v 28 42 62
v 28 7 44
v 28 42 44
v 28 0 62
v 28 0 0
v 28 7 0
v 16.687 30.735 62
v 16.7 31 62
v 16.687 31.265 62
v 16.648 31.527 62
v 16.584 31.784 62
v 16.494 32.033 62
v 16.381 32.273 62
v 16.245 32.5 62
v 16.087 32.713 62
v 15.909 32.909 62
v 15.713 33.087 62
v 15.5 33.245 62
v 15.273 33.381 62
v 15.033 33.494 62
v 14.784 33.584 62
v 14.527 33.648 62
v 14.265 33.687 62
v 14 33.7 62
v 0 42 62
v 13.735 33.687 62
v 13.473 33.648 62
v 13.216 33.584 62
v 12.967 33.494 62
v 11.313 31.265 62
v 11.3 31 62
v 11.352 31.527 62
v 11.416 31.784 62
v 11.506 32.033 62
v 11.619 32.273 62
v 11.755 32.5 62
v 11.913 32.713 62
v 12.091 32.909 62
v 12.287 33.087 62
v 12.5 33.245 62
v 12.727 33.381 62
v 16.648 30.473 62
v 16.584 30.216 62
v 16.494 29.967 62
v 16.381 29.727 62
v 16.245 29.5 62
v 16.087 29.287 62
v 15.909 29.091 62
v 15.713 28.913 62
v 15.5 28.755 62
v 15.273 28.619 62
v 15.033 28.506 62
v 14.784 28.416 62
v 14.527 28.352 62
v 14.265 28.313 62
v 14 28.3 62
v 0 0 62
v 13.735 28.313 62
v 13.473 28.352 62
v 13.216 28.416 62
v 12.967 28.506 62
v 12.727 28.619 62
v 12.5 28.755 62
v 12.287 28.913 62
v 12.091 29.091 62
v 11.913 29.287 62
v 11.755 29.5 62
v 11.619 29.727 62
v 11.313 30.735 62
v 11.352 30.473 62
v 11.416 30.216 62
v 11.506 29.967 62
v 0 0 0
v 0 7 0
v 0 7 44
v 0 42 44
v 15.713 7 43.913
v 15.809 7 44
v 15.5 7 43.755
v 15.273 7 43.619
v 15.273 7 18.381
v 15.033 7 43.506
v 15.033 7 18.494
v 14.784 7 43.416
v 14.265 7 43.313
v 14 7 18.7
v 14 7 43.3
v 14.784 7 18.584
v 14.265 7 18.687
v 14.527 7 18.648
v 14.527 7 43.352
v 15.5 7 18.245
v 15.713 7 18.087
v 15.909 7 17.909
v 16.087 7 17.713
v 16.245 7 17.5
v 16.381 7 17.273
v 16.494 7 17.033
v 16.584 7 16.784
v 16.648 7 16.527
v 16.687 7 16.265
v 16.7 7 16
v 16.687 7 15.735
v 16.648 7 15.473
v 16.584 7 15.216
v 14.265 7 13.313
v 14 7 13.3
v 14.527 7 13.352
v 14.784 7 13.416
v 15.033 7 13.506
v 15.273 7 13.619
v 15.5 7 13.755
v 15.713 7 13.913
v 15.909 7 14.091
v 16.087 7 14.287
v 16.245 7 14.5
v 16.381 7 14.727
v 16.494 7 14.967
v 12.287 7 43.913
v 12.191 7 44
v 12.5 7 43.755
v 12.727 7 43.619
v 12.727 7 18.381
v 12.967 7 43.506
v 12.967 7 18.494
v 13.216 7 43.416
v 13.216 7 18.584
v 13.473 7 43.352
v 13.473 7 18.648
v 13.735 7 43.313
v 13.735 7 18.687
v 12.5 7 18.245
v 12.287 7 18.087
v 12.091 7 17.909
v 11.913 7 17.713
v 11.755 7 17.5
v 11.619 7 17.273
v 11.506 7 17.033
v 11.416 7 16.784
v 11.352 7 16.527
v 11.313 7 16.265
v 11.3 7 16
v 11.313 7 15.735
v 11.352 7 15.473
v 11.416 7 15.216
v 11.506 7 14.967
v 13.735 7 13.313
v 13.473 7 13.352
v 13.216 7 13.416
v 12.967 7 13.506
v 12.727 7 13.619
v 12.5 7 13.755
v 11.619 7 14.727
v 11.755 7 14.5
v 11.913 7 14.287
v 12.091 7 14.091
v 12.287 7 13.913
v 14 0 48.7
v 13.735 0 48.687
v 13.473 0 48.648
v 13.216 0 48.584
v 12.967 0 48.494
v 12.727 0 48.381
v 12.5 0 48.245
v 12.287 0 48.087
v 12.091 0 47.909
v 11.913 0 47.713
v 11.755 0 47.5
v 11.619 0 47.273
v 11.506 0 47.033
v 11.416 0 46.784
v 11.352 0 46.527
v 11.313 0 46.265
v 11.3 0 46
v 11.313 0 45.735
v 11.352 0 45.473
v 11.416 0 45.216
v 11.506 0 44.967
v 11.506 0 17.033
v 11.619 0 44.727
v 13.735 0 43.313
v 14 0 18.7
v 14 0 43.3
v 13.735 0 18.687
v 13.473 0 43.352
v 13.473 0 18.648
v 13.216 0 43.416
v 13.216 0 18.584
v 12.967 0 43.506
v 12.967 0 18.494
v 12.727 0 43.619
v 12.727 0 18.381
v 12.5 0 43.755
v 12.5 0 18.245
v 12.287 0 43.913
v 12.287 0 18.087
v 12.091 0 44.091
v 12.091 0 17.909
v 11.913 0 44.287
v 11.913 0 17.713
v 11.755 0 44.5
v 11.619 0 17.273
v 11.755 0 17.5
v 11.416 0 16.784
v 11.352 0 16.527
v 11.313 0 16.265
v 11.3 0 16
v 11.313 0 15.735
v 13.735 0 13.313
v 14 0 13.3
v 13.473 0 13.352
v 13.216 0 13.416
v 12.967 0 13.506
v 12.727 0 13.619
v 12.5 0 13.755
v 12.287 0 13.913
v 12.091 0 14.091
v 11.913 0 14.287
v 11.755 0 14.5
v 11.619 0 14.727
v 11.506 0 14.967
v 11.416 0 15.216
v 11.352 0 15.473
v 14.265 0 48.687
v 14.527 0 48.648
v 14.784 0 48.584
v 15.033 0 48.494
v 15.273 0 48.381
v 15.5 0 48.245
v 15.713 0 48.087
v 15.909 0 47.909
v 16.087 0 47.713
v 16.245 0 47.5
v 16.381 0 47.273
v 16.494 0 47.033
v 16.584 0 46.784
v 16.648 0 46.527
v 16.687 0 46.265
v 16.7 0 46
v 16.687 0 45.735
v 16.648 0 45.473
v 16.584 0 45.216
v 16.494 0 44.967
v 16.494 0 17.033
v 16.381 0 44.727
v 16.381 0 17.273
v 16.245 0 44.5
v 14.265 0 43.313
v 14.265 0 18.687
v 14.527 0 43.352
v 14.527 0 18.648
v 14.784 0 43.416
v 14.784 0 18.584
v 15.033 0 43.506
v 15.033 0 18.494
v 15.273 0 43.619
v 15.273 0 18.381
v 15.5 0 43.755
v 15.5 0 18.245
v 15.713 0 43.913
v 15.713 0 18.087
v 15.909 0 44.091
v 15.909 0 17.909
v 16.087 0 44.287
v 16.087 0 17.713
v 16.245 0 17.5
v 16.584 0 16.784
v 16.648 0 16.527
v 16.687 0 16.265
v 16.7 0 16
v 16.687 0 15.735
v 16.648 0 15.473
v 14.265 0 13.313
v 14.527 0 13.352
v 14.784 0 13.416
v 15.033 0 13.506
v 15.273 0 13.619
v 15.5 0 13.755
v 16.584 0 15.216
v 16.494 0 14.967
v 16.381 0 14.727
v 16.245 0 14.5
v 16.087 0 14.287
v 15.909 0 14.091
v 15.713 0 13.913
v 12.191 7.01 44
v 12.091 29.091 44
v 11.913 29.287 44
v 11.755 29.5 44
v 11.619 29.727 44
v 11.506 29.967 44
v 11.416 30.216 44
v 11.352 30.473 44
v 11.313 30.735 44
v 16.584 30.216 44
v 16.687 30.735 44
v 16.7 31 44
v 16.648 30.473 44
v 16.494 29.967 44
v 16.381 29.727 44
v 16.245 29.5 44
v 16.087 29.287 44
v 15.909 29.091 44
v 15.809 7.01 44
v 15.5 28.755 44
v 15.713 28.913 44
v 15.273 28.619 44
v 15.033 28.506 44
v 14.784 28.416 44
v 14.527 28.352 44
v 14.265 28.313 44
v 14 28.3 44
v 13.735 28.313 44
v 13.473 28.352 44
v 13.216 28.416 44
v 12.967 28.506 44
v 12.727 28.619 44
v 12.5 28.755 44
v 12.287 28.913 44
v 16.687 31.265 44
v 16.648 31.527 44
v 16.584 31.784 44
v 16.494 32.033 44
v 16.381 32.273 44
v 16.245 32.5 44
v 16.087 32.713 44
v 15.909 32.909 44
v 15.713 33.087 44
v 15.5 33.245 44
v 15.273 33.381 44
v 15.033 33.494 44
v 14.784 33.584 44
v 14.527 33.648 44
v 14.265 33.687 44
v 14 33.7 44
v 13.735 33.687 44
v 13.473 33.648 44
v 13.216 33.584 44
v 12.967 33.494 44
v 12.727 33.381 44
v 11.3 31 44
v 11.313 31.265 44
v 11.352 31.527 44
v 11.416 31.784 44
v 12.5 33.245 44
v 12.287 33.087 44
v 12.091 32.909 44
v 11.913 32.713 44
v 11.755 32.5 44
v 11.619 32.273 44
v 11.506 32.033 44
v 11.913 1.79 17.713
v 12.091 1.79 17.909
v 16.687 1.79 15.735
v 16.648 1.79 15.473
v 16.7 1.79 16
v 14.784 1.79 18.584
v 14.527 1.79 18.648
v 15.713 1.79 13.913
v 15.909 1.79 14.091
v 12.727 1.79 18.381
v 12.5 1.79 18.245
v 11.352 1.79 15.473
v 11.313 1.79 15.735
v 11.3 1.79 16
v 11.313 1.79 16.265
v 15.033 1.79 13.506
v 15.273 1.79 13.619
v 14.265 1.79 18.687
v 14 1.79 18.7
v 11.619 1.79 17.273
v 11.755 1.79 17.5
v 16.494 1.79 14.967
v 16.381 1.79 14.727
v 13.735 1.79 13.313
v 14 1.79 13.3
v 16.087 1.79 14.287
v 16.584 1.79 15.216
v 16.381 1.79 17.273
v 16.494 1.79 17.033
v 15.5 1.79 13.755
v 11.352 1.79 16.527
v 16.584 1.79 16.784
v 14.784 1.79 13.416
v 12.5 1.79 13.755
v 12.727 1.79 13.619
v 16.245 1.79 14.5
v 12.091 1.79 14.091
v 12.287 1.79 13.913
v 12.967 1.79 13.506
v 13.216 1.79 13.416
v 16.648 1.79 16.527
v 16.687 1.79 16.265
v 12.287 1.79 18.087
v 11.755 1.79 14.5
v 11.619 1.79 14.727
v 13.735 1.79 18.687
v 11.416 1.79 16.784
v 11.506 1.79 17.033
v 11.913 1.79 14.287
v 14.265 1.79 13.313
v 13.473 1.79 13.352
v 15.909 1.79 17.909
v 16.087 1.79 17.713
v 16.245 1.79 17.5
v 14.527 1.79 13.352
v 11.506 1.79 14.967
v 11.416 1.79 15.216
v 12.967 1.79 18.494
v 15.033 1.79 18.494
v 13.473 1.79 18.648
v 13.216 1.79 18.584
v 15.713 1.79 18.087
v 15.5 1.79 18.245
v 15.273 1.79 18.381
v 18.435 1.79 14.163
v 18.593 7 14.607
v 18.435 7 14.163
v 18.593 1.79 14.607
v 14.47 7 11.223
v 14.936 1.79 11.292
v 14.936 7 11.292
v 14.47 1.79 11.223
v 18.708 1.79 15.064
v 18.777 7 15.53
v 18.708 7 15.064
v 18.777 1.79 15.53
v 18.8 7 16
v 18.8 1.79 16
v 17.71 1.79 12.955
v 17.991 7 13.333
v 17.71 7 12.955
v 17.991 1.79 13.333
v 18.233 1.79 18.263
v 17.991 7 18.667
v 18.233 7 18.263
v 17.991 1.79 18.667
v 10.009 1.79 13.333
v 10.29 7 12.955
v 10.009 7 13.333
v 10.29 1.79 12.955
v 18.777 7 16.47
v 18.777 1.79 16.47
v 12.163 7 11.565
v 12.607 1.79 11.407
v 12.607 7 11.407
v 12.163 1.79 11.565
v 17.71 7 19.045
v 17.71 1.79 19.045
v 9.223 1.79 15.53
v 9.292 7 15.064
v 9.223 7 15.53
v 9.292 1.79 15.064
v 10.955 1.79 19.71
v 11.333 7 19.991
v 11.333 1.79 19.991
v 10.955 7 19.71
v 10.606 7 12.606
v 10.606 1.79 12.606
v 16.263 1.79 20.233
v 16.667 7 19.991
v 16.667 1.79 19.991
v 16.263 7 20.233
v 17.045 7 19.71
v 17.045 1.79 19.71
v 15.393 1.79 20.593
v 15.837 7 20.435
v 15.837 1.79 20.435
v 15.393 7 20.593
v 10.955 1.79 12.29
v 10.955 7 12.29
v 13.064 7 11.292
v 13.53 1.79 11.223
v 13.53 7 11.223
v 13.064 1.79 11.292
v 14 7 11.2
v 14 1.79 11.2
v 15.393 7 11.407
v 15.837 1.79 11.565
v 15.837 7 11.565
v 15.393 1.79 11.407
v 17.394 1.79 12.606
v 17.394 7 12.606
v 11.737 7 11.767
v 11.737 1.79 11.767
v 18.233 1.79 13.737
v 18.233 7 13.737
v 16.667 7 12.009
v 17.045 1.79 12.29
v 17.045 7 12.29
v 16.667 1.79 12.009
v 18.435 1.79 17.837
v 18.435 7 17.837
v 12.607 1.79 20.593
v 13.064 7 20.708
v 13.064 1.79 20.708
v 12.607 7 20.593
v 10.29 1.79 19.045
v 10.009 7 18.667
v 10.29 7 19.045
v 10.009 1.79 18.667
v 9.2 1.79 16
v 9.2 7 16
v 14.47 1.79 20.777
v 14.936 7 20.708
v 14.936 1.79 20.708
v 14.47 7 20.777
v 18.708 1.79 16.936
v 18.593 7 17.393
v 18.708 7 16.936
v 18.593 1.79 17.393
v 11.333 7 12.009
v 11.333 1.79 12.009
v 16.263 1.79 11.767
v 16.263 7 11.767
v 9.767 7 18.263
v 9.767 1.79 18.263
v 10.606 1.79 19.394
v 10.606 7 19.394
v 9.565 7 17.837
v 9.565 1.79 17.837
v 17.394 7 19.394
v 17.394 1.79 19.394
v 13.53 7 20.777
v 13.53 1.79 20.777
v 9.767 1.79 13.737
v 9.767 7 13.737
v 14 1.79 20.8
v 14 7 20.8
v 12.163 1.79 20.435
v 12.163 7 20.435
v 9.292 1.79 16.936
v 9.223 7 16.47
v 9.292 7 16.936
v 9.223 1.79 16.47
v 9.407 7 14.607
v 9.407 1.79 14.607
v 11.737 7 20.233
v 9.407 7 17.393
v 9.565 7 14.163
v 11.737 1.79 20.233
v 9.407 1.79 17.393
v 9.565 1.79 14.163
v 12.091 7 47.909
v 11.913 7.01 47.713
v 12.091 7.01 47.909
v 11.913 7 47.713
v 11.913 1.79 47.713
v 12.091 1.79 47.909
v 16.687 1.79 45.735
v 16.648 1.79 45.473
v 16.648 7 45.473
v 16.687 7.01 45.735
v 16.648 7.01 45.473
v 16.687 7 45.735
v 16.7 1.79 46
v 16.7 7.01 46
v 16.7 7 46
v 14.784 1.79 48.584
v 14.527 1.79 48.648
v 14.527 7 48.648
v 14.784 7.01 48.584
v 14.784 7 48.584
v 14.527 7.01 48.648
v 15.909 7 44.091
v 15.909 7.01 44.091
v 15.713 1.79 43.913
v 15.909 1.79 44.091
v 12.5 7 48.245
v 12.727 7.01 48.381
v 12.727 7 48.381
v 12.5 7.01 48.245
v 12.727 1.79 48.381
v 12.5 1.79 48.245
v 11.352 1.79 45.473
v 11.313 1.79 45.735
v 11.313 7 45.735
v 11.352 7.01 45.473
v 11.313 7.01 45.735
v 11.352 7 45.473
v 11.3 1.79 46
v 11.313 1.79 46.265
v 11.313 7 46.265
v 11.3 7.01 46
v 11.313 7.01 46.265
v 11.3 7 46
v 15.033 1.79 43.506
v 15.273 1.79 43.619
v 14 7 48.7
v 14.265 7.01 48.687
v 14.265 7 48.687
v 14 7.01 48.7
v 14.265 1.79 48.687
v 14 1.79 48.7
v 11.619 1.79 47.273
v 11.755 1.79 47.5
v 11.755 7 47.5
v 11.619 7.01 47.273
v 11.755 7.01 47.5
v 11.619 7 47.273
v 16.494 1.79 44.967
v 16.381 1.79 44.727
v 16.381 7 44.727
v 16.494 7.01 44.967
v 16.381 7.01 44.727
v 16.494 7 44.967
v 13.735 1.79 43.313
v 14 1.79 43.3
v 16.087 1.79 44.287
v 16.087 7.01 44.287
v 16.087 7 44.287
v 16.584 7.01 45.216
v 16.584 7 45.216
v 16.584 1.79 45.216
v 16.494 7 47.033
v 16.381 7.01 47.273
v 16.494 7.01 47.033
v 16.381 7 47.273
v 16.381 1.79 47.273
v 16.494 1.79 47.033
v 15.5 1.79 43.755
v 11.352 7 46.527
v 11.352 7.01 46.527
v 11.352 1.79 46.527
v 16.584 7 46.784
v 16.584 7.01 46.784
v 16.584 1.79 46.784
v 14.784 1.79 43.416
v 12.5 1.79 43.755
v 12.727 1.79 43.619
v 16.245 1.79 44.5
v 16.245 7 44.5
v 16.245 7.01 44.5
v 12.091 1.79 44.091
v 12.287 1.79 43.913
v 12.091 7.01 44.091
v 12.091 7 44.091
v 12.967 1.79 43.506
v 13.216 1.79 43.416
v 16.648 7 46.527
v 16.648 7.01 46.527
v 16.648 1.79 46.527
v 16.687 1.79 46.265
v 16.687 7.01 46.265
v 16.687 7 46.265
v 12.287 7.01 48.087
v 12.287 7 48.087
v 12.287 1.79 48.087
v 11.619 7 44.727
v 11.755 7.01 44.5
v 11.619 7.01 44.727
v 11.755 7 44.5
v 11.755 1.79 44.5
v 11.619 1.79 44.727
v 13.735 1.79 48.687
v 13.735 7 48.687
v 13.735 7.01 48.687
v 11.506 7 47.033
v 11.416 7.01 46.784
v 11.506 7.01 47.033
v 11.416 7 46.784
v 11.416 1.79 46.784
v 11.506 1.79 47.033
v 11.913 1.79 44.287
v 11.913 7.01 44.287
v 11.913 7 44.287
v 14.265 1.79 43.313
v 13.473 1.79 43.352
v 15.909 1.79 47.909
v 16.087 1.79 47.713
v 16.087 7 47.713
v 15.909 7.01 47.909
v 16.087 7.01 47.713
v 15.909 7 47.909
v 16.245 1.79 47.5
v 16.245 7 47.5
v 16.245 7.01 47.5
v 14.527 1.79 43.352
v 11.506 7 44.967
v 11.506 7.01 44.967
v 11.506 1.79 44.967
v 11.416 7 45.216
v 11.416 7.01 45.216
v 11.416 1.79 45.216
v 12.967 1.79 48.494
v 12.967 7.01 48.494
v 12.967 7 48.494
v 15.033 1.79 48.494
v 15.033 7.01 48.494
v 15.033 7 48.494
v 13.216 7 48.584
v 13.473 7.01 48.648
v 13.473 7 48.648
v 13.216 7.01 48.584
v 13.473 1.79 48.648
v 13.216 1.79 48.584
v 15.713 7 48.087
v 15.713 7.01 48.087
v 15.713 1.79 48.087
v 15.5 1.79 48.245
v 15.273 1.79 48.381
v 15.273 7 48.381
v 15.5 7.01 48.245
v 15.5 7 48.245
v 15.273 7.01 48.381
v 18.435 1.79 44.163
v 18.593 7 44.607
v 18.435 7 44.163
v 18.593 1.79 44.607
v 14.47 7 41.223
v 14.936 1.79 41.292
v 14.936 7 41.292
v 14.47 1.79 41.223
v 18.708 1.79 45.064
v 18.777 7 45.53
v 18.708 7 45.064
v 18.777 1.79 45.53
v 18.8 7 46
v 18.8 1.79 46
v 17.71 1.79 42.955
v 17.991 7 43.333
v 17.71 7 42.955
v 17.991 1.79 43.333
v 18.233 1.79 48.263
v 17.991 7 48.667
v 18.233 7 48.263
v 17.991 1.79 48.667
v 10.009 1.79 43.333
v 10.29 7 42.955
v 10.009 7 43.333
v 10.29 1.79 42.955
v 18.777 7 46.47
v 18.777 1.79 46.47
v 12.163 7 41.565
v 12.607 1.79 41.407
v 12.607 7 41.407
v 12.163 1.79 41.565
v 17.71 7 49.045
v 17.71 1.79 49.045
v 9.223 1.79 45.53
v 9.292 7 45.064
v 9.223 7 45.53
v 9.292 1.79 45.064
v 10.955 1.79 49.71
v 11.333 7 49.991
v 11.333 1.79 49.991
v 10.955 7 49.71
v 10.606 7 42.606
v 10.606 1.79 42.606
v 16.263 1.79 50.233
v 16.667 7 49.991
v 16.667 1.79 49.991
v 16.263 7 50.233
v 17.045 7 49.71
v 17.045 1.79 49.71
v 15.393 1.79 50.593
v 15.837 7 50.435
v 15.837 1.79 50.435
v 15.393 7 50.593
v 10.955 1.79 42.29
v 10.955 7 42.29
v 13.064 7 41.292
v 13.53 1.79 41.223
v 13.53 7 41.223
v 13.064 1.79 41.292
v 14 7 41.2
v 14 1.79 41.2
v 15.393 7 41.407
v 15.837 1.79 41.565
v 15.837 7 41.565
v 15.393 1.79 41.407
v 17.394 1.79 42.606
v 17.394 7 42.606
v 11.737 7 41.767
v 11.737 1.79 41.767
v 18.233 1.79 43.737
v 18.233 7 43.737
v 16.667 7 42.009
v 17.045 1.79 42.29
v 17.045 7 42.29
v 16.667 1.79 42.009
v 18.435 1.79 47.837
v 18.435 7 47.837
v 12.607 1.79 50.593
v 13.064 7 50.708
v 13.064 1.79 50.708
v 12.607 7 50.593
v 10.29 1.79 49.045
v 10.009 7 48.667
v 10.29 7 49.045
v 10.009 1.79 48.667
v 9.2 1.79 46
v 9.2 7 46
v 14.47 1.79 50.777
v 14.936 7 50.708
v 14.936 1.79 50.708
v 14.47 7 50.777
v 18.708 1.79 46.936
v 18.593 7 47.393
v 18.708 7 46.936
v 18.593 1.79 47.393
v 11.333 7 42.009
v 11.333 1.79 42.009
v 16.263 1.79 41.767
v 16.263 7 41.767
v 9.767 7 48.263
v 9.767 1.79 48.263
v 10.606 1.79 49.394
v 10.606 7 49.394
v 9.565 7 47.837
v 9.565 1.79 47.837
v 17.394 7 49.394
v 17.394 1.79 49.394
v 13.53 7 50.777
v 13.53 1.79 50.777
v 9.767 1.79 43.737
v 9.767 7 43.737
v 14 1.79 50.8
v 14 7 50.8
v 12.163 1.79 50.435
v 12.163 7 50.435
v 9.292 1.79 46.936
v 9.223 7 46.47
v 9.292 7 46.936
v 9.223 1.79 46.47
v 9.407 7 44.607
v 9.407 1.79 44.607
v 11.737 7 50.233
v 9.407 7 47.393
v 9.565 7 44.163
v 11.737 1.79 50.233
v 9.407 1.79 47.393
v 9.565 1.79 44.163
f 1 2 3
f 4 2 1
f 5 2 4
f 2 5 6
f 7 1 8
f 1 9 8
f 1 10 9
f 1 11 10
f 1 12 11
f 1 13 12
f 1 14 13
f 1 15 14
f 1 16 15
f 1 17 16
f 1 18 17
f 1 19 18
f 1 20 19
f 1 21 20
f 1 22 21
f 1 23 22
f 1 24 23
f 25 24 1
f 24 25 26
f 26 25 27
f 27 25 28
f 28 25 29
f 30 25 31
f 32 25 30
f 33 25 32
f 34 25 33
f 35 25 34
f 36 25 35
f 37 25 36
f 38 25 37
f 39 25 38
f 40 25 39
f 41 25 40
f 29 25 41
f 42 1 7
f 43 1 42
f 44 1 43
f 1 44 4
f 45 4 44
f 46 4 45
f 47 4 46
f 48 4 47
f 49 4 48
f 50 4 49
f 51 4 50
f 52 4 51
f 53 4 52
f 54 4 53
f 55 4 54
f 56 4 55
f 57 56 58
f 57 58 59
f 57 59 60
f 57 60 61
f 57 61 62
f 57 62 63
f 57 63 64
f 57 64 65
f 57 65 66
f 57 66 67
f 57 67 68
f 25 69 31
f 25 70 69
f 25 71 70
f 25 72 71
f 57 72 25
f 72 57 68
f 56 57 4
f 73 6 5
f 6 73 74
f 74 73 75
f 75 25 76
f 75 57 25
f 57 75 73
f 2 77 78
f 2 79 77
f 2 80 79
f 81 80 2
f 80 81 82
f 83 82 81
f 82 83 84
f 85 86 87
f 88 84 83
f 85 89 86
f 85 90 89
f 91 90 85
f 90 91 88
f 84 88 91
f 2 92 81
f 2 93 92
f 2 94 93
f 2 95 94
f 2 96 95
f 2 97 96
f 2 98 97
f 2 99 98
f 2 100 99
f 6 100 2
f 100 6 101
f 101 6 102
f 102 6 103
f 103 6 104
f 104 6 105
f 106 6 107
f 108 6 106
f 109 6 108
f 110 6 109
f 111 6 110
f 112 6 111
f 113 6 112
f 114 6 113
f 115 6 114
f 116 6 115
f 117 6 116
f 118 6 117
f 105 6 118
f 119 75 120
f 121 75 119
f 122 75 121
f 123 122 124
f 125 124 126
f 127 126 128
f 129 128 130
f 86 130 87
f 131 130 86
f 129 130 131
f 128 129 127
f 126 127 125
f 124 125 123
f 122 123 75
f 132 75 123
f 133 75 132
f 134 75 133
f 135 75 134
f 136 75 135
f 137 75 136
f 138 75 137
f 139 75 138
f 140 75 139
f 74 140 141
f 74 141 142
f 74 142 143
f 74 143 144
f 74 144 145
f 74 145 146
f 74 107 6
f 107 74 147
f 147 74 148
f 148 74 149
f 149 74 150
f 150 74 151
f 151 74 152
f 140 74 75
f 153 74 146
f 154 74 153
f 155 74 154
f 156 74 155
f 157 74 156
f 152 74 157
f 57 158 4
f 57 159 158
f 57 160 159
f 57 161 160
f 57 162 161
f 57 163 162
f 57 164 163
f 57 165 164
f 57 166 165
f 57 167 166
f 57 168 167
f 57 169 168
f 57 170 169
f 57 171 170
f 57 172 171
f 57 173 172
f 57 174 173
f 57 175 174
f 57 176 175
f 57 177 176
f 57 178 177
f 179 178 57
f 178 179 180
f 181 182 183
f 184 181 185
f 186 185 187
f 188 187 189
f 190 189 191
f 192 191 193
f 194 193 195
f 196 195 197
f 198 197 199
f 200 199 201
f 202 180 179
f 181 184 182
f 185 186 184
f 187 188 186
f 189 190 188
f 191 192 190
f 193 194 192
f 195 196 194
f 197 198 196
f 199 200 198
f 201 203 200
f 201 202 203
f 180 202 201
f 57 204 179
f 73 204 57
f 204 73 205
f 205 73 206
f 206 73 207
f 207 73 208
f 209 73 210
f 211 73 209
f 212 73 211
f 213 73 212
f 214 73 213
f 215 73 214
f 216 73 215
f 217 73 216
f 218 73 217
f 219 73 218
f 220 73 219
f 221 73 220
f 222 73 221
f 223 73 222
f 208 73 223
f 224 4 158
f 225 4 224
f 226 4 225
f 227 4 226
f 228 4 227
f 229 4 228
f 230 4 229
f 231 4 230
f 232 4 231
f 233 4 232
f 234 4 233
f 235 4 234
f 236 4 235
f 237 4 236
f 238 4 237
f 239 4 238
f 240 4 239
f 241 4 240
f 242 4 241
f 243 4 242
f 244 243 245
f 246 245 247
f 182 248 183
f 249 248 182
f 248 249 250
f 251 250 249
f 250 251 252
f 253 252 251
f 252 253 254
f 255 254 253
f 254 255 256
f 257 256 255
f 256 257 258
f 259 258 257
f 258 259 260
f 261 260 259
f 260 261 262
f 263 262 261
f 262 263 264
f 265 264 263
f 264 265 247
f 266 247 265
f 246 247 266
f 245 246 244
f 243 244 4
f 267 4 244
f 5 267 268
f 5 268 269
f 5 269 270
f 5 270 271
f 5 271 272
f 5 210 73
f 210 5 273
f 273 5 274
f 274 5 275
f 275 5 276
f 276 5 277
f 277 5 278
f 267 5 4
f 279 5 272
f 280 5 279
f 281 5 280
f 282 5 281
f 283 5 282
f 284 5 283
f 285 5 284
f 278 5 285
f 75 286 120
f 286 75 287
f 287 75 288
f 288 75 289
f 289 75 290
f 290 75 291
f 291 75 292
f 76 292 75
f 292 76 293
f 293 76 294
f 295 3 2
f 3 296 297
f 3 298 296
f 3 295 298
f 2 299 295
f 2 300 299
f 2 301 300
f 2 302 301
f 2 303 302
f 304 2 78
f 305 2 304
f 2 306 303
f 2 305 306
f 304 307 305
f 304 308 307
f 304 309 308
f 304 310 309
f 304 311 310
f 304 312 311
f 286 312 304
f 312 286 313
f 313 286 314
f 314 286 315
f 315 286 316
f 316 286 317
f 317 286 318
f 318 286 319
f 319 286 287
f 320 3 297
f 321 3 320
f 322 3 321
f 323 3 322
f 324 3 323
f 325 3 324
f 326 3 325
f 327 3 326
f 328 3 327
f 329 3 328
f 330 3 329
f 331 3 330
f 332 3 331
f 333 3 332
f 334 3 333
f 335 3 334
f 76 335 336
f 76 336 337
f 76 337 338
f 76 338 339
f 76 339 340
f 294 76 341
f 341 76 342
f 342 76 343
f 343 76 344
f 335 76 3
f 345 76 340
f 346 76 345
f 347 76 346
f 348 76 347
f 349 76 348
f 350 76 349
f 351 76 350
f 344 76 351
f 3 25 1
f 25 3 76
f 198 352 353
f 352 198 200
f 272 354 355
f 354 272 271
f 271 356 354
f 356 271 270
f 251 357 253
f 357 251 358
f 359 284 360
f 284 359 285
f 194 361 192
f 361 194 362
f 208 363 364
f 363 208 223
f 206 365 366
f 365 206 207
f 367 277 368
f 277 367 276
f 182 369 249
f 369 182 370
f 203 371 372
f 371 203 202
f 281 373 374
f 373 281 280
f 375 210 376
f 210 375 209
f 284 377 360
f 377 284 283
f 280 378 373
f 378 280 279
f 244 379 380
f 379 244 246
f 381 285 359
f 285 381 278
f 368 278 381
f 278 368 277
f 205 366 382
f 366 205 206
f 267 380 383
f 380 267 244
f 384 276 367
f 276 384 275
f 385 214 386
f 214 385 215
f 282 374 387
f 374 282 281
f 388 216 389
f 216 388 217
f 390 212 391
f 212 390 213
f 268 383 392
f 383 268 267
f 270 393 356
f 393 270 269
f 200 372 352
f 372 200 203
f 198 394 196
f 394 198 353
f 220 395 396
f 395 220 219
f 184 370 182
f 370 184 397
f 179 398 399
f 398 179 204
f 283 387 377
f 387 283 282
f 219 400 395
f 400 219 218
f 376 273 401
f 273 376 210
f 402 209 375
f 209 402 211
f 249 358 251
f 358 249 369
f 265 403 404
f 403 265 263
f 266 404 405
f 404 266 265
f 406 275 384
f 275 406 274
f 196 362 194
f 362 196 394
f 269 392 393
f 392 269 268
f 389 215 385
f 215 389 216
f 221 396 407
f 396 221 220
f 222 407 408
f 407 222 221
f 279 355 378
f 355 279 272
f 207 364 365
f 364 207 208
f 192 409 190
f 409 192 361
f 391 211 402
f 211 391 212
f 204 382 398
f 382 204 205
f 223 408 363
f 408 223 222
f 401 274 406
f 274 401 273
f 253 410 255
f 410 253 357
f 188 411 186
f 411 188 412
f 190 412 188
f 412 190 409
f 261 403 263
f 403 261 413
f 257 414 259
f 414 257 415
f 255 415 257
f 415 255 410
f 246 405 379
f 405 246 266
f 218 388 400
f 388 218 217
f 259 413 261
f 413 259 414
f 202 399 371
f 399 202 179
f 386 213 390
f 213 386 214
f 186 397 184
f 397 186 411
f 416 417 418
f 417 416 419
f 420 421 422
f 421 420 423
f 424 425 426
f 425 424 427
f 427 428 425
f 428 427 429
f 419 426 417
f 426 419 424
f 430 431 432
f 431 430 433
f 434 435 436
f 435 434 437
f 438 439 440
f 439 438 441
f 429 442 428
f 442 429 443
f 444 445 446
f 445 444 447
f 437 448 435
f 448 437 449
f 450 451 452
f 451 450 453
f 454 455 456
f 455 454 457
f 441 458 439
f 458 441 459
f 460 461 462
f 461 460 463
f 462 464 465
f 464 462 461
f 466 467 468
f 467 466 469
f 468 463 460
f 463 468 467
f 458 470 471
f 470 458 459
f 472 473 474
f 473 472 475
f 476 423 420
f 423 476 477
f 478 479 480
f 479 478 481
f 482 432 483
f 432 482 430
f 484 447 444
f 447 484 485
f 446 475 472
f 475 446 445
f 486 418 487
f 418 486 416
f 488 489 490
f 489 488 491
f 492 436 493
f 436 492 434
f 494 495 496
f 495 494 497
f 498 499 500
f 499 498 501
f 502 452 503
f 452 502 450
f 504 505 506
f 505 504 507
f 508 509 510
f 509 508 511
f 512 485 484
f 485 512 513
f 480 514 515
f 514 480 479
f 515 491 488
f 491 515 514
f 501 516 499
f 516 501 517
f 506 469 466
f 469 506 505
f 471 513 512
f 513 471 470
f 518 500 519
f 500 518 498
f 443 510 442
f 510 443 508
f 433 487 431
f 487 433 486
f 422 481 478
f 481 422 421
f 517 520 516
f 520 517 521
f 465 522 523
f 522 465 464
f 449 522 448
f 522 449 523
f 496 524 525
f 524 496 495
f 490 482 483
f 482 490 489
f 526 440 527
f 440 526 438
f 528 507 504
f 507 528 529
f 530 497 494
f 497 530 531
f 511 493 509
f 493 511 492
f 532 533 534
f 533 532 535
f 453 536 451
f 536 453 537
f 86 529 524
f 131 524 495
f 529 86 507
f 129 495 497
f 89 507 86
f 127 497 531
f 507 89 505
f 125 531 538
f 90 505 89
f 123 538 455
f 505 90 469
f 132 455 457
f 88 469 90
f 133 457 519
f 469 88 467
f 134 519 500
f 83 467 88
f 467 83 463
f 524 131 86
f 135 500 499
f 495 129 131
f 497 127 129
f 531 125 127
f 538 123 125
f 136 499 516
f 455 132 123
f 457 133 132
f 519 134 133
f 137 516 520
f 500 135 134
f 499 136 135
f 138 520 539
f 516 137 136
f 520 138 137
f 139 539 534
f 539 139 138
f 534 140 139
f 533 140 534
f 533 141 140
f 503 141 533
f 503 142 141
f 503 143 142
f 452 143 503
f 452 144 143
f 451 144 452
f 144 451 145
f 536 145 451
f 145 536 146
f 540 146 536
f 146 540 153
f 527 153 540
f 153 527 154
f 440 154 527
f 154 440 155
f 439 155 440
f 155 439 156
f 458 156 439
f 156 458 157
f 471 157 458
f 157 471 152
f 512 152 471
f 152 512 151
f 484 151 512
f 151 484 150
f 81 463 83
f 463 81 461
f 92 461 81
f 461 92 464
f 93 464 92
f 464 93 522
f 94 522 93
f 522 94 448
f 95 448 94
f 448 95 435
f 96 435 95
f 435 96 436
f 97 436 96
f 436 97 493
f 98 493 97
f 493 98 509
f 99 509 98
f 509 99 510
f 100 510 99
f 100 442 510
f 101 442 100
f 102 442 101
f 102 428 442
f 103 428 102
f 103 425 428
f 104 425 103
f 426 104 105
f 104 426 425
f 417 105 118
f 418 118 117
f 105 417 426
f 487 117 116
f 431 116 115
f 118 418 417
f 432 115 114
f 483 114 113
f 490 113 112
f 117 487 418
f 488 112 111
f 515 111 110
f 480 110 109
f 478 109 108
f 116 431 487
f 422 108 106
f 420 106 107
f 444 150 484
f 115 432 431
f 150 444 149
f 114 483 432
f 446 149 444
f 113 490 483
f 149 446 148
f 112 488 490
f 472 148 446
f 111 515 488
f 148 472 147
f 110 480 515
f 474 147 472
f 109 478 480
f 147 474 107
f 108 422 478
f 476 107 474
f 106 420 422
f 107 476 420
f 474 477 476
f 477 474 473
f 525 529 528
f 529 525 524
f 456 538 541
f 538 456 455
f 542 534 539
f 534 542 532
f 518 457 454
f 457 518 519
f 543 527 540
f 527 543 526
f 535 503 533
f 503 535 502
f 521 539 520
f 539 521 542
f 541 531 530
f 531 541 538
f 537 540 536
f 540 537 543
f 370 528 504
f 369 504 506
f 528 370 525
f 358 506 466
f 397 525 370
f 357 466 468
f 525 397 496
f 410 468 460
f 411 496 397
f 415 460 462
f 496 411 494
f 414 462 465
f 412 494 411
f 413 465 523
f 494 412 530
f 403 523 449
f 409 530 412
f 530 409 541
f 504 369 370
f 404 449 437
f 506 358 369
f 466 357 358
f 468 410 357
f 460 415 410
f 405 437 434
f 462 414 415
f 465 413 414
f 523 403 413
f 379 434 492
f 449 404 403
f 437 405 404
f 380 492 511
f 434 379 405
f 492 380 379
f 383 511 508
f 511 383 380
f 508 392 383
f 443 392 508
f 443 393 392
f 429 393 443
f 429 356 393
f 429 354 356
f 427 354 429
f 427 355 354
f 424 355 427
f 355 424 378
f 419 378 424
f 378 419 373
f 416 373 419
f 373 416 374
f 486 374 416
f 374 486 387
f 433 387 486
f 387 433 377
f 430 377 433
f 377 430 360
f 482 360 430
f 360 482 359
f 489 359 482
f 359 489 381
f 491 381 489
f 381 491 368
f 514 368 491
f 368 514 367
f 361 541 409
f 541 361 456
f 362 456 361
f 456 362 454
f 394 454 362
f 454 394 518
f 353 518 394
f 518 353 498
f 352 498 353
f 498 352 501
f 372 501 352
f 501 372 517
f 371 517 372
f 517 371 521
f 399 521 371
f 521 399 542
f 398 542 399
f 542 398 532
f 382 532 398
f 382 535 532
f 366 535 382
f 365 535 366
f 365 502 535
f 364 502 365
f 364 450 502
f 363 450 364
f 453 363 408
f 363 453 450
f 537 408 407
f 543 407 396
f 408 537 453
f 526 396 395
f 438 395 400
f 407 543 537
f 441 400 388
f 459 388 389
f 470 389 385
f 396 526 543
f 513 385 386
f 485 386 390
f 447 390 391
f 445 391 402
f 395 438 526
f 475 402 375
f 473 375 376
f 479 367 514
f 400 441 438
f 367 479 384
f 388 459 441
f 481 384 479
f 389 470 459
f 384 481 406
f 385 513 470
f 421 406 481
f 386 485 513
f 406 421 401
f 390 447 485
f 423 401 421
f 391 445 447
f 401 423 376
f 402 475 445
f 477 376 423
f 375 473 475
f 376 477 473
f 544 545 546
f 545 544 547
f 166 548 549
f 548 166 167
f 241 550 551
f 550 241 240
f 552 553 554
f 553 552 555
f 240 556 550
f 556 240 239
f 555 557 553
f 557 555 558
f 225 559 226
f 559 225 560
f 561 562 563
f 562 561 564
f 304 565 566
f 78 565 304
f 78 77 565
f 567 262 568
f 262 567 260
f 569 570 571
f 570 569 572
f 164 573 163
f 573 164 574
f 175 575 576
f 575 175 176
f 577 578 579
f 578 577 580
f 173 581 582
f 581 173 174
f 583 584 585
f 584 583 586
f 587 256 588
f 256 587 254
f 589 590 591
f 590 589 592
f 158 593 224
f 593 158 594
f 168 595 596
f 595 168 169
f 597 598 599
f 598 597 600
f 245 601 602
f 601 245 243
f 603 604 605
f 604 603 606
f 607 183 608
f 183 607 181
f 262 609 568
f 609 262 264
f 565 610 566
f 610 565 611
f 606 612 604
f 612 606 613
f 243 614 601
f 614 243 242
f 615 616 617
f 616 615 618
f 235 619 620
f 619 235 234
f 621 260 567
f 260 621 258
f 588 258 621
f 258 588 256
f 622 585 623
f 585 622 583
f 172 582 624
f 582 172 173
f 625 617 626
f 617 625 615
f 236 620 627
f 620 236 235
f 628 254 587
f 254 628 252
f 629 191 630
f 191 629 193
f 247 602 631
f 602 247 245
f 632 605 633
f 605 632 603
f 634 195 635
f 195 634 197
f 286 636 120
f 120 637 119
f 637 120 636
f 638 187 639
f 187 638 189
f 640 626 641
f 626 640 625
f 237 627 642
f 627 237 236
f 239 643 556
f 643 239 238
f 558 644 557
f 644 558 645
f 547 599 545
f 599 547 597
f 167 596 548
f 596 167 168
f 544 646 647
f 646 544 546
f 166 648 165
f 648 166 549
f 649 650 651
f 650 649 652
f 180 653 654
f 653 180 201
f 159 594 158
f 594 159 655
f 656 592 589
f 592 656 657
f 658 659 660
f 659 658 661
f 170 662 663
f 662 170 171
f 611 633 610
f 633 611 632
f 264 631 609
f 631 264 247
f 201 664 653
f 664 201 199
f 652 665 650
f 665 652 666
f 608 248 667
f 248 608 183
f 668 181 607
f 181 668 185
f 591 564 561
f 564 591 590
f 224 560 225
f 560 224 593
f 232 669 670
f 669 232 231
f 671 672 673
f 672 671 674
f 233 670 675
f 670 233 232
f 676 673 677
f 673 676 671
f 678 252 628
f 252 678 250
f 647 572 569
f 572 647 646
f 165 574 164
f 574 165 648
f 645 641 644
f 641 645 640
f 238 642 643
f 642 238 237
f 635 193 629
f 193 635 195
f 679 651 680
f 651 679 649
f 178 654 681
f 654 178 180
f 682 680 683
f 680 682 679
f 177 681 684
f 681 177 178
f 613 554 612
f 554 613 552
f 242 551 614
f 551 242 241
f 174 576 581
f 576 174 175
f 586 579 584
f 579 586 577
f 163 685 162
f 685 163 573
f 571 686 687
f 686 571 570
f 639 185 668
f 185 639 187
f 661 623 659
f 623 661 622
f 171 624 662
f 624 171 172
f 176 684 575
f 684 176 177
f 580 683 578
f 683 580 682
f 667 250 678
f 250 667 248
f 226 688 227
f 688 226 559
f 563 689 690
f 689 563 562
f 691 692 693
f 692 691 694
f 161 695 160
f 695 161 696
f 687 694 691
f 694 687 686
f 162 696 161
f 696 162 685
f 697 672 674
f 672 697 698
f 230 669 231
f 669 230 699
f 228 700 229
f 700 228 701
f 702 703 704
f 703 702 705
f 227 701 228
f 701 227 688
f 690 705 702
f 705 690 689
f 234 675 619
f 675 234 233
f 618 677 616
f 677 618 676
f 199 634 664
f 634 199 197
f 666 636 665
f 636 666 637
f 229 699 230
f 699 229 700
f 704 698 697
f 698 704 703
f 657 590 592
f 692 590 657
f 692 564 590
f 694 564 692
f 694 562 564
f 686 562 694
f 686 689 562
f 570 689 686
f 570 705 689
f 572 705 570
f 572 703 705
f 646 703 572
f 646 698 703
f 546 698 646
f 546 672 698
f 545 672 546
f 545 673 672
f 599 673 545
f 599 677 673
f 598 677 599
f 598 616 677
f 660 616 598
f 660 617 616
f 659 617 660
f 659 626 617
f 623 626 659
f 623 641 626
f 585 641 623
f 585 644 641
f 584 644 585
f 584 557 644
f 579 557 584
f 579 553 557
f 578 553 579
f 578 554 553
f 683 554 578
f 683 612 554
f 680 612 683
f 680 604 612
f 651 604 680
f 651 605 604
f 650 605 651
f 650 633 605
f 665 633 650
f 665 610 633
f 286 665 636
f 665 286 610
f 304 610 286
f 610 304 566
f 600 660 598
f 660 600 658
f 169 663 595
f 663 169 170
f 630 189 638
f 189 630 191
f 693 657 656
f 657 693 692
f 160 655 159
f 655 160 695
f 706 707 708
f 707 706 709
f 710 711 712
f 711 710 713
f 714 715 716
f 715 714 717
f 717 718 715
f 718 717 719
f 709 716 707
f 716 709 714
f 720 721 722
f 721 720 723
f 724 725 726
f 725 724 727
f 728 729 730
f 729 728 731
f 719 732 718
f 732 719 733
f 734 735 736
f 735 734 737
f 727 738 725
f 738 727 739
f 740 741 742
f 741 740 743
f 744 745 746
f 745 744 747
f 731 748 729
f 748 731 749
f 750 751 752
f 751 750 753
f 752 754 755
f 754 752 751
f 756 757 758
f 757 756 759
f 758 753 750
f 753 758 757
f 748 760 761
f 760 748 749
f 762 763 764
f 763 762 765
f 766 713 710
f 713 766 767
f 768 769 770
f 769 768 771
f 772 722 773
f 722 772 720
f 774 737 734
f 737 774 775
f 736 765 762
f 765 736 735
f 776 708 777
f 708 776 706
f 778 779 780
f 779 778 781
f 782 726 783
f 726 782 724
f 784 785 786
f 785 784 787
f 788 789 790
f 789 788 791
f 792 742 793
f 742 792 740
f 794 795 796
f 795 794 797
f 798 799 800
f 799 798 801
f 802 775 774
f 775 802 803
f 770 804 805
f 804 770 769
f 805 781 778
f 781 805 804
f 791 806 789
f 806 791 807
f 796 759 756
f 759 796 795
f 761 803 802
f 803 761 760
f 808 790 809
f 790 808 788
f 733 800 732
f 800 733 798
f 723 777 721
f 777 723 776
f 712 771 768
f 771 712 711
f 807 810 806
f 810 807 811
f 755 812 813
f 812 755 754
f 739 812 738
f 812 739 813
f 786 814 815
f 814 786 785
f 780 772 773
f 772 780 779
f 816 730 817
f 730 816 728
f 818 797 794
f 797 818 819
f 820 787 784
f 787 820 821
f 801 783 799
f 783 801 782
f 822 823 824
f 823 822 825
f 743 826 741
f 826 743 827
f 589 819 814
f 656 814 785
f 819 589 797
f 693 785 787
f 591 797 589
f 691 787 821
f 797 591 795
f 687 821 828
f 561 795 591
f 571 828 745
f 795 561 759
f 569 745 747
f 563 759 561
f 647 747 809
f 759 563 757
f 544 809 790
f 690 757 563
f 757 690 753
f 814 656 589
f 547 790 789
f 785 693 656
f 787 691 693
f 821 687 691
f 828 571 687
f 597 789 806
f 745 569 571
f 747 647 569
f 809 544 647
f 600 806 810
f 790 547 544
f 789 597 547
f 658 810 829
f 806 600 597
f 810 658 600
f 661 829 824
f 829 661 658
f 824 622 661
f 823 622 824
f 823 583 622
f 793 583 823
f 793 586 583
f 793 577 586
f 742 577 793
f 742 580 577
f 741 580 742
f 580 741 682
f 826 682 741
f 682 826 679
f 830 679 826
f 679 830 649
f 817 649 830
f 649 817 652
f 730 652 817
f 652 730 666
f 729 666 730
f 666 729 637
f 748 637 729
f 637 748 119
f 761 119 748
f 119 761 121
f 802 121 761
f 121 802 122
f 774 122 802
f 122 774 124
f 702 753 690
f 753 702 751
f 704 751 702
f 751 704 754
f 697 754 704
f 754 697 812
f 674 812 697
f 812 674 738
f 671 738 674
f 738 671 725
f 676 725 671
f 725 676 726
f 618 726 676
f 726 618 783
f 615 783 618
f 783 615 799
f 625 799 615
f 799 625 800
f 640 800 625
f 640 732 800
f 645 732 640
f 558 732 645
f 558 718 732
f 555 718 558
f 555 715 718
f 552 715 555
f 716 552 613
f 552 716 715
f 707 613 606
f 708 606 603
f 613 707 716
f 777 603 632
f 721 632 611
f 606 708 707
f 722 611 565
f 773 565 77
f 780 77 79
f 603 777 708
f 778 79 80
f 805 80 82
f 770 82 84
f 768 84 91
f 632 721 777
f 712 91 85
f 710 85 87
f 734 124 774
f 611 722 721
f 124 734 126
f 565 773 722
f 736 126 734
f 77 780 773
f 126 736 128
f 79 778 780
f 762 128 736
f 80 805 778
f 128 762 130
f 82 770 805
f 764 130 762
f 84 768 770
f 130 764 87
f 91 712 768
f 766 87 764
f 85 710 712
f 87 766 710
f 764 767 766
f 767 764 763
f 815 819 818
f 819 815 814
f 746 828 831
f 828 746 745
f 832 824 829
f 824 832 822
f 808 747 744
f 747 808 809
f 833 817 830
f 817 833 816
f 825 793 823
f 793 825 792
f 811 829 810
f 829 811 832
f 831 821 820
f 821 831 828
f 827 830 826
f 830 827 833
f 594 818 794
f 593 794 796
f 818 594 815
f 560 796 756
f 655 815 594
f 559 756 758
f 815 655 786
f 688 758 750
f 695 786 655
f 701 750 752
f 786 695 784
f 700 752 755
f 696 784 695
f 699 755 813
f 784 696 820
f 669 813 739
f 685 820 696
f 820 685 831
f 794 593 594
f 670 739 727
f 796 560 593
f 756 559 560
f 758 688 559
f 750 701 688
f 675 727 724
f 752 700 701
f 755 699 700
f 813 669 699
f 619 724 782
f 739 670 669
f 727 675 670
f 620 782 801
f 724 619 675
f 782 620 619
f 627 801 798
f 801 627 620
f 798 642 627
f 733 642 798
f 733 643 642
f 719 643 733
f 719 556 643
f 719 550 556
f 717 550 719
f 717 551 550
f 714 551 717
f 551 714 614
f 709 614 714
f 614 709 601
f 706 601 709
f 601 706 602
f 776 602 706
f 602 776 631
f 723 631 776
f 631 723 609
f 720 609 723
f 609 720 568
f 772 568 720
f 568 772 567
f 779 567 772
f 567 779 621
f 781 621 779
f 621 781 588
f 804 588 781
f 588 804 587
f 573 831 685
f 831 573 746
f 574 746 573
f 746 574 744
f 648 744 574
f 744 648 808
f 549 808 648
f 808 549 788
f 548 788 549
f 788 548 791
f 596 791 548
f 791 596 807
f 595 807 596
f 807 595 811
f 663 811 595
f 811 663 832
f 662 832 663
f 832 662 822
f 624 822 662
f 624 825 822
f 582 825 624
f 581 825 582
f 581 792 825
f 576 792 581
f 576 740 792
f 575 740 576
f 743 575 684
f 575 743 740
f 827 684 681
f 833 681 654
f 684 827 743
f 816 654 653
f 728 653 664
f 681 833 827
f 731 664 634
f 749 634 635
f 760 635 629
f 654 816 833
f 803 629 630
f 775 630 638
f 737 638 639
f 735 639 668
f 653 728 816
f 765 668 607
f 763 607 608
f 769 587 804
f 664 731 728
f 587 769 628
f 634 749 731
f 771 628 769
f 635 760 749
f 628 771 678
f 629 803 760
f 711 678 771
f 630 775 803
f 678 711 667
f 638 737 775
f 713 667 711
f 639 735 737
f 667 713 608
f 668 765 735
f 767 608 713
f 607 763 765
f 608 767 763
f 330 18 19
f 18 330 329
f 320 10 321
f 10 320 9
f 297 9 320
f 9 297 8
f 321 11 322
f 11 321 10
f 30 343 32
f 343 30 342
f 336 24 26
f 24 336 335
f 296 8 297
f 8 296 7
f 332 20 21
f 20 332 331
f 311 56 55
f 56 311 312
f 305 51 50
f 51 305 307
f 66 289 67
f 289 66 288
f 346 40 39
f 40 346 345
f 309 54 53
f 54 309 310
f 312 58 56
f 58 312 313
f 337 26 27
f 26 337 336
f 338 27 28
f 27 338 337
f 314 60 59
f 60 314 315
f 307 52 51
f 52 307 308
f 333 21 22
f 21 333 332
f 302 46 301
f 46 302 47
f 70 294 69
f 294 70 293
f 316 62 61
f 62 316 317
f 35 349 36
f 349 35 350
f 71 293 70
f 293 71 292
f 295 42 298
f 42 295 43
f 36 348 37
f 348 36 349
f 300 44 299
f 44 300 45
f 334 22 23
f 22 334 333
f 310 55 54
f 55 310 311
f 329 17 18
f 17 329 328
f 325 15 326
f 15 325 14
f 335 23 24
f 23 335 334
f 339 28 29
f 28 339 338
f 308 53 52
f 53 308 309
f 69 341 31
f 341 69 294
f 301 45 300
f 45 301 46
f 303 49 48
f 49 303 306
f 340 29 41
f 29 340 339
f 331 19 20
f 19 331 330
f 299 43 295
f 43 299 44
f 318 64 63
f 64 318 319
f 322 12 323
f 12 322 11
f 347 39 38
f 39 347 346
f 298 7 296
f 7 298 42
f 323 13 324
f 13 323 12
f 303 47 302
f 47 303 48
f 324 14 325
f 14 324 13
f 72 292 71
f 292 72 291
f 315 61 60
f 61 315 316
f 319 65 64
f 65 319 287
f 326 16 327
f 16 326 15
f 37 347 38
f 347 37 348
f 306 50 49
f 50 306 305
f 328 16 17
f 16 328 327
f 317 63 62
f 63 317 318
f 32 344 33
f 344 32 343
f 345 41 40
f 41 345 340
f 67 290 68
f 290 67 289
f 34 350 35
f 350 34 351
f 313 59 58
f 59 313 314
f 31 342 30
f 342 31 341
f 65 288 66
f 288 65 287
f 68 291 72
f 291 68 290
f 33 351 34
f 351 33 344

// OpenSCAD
// file: params.scad
// ArtBot - shared parameters for all printed parts. Units: mm.
// Anything tagged VERIFY must be measured against the parts actually ordered
// before you burn filament on a full set.

$fn = 64;
eps = 0.01;

/* ---------- fasteners (clearance holes, not tapped) ---------- */
m2_clear   = 2.4;
m3_clear   = 3.4;
m3_nut_af  = 5.6;   // across flats
m3_nut_t   = 2.6;
m5_clear   = 5.4;
m5_head_d  = 9.6;
m5_head_h  = 5.2;

/* ---------- V-slot extrusion ---------- */
vslot      = 20;    // 2020 face width
vslot_2040 = 40;    // 2040 long face

/* ---------- gantry plate bolt grid ----------
   OpenBuilds Mini-V / Xtreme plates all use a 20 mm M5 grid.
   VERIFY the actual hole positions on the plate you buy - vendors differ
   on WHICH grid holes are present, not on the pitch.                      */
plate_grid = 20;

/* ---------- GT2 belt ---------- */
belt_w      = 6;
belt_pitch  = 2;
belt_back   = 0.80;  // thickness behind the teeth
belt_tooth  = 0.75;  // tooth depth

/* ---------- pen shuttle guide rods ---------- */
rod_d       = 8;
rod_press   = 7.85;  // interference fit in the fixed walls (tune per printer)
rod_slide   = 8.5;   // running clearance in the moving shuttle
rod_spacing = 40;    // centre-to-centre, horizontal
rod_len     = 74;    // cut length. base plate + span + front wall

/* ---------- whiteboard marker ---------- */
pen_d       = 17;    // VERIFY: calliper the barrel of the marker you'll use
pen_clear_d = 24;    // pass-through in the front wall

/* ---------- SG90 servo ----------
   Mount holes are SLOTTED in servo_bracket_sg90.scad on purpose: SG90 clones
   vary by ~1 mm and the throw needs fore/aft trimming at assembly anyway.   */
sg90_len     = 23.0;
sg90_wid     = 12.4;
sg90_hgt     = 22.6;
sg90_tab_span = 32.2;  // screw centre to screw centre
sg90_tab_t    = 2.6;
sg90_screw_d  = 2.4;

/* ---------- limit switch (V-153 / KW12 style lever microswitch) ---------- */
sw_hole_pitch = 9.5;  // VERIFY against your switch
sw_hole_d     = 2.6;
// main file
// ArtBot - idler bracket for 2020 extrusion. Qty 3.
//   2x bottom of the left/right vertical rails (Y belt return)
//   1x right end of the horizontal rail (X belt return)
// Holds a 20T GT2 idler on an M5 bolt. Bolts into the extrusion slot on
// two M5 T-nuts.
include <params.scad>

br_t      = 7;
br_w      = 28;
br_h      = 62;
idler_off = 42;   // slot face -> idler axis. sets the belt plane; VERIFY it
                  // lines up with the motor pulley plane before printing 3.
tnut_pitch = 30;

difference() {
    union() {
        cube([br_w, br_t, br_h]);                       // face plate on the extrusion
        translate([0, 0, br_h - 18]) cube([br_w, idler_off, 18]);  // idler arm
    }

    // 2x M5 into the extrusion slot, counterbored
    for (z = [br_h/2 - tnut_pitch/2, br_h/2 + tnut_pitch/2])
        translate([br_w/2, -eps, z]) rotate([-90, 0, 0]) {
            cylinder(d = m5_clear, h = br_t + 2*eps);
            translate([0, 0, br_t - m5_head_h]) cylinder(d = m5_head_d, h = m5_head_h + eps);
        }

    // idler axle: M5 through the arm, nut trap on top
    translate([br_w/2, idler_off - 11, br_h - 18 - eps])
        cylinder(d = m5_clear, h = 18 + 2*eps);
}

// PRINT: face plate flat on the bed, arm pointing up, WITH supports under the
// arm overhang. 5 perimeters, 60% infill - this part is in the belt load path
// and a sloppy one shows up as wandering lines.
